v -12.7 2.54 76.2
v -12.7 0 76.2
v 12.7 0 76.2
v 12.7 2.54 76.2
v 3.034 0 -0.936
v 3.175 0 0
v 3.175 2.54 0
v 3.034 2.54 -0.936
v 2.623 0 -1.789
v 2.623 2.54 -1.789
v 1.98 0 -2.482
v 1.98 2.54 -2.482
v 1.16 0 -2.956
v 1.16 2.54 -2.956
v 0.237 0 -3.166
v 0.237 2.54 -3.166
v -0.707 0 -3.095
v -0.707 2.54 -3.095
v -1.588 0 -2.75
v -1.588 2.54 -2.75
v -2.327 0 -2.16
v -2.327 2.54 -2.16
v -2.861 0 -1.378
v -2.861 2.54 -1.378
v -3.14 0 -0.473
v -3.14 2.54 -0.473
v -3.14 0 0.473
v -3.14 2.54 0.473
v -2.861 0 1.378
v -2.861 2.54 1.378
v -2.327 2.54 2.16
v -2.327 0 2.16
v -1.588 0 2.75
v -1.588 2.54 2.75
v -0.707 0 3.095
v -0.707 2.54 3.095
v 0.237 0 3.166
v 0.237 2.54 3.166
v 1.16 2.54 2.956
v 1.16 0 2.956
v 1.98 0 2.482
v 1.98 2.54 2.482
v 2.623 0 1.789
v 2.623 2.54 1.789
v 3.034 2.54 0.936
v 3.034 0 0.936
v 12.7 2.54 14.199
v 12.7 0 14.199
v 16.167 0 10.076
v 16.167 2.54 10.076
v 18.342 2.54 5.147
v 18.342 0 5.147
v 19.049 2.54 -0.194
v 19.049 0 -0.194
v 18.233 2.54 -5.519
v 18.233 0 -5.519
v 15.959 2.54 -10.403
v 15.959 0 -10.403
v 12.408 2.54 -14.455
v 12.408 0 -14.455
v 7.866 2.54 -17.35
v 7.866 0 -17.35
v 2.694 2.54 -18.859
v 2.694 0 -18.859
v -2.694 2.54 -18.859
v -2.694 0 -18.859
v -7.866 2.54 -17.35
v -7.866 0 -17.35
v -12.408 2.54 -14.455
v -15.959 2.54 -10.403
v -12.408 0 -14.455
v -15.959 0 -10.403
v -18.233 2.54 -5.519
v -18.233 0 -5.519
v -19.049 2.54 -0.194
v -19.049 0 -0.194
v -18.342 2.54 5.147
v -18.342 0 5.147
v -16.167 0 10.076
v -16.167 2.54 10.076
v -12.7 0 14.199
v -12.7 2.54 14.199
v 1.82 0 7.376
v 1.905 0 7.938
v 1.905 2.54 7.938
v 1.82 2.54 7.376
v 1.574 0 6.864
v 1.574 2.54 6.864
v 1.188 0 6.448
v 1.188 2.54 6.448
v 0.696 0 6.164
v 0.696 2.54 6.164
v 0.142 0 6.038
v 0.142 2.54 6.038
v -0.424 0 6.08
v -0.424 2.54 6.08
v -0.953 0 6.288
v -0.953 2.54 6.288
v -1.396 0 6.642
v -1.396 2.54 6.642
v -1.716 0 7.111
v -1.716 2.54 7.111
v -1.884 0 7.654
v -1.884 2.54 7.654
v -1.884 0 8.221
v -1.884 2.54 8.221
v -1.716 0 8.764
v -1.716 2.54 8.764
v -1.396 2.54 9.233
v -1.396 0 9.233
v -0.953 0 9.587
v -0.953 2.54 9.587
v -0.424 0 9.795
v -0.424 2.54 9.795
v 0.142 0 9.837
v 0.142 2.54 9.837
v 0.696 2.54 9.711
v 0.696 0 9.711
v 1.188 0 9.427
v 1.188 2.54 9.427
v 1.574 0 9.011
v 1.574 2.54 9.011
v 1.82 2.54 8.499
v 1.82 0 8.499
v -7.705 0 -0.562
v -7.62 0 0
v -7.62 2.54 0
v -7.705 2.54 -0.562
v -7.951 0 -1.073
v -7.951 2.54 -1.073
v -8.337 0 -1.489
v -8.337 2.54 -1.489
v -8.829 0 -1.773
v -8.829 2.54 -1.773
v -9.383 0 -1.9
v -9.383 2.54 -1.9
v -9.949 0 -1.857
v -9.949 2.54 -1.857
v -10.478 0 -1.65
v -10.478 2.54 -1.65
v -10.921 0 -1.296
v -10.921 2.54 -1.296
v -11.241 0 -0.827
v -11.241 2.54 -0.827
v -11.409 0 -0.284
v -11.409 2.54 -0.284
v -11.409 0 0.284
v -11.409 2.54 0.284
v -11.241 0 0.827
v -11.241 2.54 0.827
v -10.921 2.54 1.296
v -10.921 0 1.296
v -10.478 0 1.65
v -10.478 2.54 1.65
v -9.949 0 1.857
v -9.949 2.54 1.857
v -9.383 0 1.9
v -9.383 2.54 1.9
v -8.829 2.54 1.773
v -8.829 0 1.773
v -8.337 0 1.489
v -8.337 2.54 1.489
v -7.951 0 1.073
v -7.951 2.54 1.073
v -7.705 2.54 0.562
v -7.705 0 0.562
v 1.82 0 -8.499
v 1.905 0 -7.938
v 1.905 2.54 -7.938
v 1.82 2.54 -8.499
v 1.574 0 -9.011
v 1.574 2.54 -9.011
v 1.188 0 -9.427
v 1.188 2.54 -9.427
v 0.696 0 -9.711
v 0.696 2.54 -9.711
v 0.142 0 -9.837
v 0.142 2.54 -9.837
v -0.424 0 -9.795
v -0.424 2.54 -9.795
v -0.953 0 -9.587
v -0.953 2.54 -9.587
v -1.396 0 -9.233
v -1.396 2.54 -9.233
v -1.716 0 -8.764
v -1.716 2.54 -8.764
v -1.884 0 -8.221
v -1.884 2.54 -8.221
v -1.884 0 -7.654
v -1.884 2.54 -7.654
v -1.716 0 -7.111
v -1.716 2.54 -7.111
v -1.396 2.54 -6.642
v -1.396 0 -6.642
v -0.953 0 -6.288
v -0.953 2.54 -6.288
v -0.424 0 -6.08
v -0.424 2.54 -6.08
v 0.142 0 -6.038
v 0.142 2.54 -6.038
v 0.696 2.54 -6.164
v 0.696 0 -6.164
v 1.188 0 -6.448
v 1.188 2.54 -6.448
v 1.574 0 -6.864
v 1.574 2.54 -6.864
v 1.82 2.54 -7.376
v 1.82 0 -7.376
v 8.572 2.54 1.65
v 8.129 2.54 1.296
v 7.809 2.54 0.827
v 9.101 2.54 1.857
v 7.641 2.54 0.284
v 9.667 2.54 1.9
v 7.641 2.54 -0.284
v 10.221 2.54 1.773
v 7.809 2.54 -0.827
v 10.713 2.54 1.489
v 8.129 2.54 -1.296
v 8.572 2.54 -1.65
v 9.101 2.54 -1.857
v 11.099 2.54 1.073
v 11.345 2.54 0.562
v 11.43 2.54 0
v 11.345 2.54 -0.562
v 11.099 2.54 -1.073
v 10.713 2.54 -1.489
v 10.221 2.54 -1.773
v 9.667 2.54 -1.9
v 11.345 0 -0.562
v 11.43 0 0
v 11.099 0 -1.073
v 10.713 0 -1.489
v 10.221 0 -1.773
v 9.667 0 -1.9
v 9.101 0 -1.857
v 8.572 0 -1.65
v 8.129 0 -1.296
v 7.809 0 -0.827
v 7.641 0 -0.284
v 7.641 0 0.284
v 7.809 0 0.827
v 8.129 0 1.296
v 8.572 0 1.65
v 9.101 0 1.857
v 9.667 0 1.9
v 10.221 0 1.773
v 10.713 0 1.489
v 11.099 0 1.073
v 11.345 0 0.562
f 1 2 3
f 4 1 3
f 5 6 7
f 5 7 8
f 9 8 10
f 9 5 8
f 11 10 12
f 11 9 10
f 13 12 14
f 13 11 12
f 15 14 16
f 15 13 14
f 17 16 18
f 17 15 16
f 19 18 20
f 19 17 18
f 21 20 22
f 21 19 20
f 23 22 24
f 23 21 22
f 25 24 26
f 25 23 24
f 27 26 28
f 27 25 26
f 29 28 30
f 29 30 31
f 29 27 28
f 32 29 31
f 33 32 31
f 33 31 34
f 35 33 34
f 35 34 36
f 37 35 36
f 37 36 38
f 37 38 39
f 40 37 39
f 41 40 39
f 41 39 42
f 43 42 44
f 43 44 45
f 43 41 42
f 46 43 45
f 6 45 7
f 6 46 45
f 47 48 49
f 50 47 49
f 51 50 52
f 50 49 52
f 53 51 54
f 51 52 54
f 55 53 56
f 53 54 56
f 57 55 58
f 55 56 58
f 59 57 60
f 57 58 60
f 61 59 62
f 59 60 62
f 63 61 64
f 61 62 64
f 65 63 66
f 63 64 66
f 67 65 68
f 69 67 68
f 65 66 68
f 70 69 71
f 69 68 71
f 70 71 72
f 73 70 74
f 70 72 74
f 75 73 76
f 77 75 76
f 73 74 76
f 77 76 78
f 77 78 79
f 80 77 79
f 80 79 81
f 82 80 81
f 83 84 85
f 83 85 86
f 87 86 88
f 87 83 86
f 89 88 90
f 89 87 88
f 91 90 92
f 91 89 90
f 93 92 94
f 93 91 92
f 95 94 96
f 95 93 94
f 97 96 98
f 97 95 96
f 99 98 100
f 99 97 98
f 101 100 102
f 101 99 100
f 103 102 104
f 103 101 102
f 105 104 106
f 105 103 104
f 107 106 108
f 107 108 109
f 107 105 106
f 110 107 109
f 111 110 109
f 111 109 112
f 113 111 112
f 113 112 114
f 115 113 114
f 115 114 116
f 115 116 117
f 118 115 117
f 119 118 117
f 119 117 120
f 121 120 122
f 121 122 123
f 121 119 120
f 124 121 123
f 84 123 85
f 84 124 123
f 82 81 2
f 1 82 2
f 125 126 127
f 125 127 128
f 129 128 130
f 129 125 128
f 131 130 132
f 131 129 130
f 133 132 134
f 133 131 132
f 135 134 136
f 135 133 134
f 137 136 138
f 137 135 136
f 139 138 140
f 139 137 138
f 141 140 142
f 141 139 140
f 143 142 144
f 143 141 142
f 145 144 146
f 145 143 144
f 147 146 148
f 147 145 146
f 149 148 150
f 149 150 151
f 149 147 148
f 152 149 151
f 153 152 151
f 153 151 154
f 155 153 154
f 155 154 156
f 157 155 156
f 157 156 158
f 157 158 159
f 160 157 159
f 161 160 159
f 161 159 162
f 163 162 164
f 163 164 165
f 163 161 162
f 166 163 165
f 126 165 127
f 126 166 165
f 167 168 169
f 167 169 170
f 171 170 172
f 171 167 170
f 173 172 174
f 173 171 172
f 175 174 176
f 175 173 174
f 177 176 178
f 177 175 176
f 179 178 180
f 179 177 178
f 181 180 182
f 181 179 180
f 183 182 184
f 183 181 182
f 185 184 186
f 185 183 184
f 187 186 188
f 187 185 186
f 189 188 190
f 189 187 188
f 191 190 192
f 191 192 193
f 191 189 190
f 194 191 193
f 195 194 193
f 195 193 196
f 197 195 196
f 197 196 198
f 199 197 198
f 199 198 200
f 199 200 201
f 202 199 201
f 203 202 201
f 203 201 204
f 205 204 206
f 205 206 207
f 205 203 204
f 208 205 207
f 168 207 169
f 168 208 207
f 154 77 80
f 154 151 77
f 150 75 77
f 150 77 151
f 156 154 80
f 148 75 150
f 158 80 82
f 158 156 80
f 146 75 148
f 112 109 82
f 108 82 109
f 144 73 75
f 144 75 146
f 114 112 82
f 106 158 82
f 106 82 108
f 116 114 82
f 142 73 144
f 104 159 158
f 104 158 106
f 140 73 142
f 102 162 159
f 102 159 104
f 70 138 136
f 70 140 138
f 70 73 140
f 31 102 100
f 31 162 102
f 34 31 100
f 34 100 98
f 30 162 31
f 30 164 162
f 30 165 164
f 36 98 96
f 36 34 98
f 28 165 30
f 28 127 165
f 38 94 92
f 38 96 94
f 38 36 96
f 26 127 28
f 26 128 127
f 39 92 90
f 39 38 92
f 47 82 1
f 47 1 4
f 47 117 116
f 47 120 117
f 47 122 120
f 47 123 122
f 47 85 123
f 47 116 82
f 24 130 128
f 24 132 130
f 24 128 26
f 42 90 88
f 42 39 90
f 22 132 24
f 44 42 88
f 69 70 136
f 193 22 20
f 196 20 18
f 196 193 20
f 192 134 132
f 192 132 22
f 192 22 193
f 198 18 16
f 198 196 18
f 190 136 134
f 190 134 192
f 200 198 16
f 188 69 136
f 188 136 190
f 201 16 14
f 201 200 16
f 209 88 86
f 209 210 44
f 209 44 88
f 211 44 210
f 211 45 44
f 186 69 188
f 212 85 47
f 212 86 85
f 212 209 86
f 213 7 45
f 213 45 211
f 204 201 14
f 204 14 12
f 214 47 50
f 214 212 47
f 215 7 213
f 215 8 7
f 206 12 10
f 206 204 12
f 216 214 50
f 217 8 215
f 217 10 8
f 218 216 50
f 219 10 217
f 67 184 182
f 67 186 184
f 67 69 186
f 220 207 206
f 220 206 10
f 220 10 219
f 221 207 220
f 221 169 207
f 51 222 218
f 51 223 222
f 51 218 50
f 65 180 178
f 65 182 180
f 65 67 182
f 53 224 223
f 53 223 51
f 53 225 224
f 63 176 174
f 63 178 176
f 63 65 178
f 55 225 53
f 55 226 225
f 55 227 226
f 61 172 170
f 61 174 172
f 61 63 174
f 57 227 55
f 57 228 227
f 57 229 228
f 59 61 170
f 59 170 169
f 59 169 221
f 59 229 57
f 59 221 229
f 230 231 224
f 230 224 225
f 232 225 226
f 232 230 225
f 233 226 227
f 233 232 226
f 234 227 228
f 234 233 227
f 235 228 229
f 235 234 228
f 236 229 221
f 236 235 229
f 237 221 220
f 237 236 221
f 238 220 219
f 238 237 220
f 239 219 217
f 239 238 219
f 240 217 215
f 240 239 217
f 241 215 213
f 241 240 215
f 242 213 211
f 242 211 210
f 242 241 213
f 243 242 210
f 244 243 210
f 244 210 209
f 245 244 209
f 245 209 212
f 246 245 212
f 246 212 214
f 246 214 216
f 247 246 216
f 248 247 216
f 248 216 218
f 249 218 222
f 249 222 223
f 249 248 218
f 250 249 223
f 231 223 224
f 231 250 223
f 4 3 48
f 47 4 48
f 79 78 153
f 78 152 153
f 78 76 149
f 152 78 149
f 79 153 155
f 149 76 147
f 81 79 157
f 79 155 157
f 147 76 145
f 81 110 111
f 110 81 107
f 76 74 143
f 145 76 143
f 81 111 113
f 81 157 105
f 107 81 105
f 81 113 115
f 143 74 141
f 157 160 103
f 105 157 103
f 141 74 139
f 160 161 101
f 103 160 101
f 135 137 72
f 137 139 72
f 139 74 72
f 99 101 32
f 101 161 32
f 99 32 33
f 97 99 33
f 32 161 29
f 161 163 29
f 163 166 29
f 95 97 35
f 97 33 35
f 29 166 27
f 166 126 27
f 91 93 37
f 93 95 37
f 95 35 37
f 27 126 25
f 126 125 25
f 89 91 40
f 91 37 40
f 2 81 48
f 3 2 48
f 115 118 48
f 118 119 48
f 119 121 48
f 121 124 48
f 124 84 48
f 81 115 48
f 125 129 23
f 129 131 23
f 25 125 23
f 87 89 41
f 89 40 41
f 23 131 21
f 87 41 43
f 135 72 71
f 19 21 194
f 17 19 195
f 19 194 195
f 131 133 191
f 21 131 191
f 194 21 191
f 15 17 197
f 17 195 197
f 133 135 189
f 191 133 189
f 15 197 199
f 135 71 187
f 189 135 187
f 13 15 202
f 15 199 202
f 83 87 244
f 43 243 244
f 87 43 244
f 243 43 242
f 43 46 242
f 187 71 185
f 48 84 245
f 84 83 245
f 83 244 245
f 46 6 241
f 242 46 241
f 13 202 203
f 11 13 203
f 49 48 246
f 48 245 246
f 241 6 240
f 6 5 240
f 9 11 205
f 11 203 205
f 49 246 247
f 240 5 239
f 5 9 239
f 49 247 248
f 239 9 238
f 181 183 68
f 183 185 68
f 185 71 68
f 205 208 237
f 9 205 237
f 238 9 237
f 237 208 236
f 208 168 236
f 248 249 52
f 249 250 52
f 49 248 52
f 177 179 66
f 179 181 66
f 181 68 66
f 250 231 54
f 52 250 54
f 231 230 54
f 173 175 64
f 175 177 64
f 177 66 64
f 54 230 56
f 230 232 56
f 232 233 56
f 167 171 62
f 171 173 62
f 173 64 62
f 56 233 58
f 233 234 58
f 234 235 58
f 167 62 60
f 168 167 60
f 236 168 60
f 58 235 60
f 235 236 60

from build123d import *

# Parameters (mm, degrees)
SKETCH1_R           = 1.905
SKETCH1_R_2         = 3.175
BOSS_EXTRUDE1_DEPTH = 2.54


with BuildPart() as part:
    # Sketch1 → Boss-Extrude1 (new body)
    with BuildSketch(Plane(origin=(0, 0, 0), x_dir=(1, 0, 0), z_dir=(0, 1, 0))):
        with BuildLine():
            Line((12.7, -76.2), (12.7, -14.199031657))
            ThreePointArc((12.7, -14.199031657), (0, 19.05), (-12.7, -14.199031657))
            Line((-12.7, -14.199031657), (-12.7, -76.2))
            Line((-12.7, -76.2), (12.7, -76.2))
        make_face()
        with Locations((9.525, 0)):
            Circle(SKETCH1_R, mode=Mode.SUBTRACT)
        with Locations((-9.525, 0)):
            Circle(SKETCH1_R, mode=Mode.SUBTRACT)
        with Locations((0, 7.9375)):
            Circle(SKETCH1_R, mode=Mode.SUBTRACT)
        with Locations((0, -7.9375)):
            Circle(SKETCH1_R, mode=Mode.SUBTRACT)
        Circle(SKETCH1_R_2, mode=Mode.SUBTRACT)
    extrude(amount=BOSS_EXTRUDE1_DEPTH)


solid = part.part
